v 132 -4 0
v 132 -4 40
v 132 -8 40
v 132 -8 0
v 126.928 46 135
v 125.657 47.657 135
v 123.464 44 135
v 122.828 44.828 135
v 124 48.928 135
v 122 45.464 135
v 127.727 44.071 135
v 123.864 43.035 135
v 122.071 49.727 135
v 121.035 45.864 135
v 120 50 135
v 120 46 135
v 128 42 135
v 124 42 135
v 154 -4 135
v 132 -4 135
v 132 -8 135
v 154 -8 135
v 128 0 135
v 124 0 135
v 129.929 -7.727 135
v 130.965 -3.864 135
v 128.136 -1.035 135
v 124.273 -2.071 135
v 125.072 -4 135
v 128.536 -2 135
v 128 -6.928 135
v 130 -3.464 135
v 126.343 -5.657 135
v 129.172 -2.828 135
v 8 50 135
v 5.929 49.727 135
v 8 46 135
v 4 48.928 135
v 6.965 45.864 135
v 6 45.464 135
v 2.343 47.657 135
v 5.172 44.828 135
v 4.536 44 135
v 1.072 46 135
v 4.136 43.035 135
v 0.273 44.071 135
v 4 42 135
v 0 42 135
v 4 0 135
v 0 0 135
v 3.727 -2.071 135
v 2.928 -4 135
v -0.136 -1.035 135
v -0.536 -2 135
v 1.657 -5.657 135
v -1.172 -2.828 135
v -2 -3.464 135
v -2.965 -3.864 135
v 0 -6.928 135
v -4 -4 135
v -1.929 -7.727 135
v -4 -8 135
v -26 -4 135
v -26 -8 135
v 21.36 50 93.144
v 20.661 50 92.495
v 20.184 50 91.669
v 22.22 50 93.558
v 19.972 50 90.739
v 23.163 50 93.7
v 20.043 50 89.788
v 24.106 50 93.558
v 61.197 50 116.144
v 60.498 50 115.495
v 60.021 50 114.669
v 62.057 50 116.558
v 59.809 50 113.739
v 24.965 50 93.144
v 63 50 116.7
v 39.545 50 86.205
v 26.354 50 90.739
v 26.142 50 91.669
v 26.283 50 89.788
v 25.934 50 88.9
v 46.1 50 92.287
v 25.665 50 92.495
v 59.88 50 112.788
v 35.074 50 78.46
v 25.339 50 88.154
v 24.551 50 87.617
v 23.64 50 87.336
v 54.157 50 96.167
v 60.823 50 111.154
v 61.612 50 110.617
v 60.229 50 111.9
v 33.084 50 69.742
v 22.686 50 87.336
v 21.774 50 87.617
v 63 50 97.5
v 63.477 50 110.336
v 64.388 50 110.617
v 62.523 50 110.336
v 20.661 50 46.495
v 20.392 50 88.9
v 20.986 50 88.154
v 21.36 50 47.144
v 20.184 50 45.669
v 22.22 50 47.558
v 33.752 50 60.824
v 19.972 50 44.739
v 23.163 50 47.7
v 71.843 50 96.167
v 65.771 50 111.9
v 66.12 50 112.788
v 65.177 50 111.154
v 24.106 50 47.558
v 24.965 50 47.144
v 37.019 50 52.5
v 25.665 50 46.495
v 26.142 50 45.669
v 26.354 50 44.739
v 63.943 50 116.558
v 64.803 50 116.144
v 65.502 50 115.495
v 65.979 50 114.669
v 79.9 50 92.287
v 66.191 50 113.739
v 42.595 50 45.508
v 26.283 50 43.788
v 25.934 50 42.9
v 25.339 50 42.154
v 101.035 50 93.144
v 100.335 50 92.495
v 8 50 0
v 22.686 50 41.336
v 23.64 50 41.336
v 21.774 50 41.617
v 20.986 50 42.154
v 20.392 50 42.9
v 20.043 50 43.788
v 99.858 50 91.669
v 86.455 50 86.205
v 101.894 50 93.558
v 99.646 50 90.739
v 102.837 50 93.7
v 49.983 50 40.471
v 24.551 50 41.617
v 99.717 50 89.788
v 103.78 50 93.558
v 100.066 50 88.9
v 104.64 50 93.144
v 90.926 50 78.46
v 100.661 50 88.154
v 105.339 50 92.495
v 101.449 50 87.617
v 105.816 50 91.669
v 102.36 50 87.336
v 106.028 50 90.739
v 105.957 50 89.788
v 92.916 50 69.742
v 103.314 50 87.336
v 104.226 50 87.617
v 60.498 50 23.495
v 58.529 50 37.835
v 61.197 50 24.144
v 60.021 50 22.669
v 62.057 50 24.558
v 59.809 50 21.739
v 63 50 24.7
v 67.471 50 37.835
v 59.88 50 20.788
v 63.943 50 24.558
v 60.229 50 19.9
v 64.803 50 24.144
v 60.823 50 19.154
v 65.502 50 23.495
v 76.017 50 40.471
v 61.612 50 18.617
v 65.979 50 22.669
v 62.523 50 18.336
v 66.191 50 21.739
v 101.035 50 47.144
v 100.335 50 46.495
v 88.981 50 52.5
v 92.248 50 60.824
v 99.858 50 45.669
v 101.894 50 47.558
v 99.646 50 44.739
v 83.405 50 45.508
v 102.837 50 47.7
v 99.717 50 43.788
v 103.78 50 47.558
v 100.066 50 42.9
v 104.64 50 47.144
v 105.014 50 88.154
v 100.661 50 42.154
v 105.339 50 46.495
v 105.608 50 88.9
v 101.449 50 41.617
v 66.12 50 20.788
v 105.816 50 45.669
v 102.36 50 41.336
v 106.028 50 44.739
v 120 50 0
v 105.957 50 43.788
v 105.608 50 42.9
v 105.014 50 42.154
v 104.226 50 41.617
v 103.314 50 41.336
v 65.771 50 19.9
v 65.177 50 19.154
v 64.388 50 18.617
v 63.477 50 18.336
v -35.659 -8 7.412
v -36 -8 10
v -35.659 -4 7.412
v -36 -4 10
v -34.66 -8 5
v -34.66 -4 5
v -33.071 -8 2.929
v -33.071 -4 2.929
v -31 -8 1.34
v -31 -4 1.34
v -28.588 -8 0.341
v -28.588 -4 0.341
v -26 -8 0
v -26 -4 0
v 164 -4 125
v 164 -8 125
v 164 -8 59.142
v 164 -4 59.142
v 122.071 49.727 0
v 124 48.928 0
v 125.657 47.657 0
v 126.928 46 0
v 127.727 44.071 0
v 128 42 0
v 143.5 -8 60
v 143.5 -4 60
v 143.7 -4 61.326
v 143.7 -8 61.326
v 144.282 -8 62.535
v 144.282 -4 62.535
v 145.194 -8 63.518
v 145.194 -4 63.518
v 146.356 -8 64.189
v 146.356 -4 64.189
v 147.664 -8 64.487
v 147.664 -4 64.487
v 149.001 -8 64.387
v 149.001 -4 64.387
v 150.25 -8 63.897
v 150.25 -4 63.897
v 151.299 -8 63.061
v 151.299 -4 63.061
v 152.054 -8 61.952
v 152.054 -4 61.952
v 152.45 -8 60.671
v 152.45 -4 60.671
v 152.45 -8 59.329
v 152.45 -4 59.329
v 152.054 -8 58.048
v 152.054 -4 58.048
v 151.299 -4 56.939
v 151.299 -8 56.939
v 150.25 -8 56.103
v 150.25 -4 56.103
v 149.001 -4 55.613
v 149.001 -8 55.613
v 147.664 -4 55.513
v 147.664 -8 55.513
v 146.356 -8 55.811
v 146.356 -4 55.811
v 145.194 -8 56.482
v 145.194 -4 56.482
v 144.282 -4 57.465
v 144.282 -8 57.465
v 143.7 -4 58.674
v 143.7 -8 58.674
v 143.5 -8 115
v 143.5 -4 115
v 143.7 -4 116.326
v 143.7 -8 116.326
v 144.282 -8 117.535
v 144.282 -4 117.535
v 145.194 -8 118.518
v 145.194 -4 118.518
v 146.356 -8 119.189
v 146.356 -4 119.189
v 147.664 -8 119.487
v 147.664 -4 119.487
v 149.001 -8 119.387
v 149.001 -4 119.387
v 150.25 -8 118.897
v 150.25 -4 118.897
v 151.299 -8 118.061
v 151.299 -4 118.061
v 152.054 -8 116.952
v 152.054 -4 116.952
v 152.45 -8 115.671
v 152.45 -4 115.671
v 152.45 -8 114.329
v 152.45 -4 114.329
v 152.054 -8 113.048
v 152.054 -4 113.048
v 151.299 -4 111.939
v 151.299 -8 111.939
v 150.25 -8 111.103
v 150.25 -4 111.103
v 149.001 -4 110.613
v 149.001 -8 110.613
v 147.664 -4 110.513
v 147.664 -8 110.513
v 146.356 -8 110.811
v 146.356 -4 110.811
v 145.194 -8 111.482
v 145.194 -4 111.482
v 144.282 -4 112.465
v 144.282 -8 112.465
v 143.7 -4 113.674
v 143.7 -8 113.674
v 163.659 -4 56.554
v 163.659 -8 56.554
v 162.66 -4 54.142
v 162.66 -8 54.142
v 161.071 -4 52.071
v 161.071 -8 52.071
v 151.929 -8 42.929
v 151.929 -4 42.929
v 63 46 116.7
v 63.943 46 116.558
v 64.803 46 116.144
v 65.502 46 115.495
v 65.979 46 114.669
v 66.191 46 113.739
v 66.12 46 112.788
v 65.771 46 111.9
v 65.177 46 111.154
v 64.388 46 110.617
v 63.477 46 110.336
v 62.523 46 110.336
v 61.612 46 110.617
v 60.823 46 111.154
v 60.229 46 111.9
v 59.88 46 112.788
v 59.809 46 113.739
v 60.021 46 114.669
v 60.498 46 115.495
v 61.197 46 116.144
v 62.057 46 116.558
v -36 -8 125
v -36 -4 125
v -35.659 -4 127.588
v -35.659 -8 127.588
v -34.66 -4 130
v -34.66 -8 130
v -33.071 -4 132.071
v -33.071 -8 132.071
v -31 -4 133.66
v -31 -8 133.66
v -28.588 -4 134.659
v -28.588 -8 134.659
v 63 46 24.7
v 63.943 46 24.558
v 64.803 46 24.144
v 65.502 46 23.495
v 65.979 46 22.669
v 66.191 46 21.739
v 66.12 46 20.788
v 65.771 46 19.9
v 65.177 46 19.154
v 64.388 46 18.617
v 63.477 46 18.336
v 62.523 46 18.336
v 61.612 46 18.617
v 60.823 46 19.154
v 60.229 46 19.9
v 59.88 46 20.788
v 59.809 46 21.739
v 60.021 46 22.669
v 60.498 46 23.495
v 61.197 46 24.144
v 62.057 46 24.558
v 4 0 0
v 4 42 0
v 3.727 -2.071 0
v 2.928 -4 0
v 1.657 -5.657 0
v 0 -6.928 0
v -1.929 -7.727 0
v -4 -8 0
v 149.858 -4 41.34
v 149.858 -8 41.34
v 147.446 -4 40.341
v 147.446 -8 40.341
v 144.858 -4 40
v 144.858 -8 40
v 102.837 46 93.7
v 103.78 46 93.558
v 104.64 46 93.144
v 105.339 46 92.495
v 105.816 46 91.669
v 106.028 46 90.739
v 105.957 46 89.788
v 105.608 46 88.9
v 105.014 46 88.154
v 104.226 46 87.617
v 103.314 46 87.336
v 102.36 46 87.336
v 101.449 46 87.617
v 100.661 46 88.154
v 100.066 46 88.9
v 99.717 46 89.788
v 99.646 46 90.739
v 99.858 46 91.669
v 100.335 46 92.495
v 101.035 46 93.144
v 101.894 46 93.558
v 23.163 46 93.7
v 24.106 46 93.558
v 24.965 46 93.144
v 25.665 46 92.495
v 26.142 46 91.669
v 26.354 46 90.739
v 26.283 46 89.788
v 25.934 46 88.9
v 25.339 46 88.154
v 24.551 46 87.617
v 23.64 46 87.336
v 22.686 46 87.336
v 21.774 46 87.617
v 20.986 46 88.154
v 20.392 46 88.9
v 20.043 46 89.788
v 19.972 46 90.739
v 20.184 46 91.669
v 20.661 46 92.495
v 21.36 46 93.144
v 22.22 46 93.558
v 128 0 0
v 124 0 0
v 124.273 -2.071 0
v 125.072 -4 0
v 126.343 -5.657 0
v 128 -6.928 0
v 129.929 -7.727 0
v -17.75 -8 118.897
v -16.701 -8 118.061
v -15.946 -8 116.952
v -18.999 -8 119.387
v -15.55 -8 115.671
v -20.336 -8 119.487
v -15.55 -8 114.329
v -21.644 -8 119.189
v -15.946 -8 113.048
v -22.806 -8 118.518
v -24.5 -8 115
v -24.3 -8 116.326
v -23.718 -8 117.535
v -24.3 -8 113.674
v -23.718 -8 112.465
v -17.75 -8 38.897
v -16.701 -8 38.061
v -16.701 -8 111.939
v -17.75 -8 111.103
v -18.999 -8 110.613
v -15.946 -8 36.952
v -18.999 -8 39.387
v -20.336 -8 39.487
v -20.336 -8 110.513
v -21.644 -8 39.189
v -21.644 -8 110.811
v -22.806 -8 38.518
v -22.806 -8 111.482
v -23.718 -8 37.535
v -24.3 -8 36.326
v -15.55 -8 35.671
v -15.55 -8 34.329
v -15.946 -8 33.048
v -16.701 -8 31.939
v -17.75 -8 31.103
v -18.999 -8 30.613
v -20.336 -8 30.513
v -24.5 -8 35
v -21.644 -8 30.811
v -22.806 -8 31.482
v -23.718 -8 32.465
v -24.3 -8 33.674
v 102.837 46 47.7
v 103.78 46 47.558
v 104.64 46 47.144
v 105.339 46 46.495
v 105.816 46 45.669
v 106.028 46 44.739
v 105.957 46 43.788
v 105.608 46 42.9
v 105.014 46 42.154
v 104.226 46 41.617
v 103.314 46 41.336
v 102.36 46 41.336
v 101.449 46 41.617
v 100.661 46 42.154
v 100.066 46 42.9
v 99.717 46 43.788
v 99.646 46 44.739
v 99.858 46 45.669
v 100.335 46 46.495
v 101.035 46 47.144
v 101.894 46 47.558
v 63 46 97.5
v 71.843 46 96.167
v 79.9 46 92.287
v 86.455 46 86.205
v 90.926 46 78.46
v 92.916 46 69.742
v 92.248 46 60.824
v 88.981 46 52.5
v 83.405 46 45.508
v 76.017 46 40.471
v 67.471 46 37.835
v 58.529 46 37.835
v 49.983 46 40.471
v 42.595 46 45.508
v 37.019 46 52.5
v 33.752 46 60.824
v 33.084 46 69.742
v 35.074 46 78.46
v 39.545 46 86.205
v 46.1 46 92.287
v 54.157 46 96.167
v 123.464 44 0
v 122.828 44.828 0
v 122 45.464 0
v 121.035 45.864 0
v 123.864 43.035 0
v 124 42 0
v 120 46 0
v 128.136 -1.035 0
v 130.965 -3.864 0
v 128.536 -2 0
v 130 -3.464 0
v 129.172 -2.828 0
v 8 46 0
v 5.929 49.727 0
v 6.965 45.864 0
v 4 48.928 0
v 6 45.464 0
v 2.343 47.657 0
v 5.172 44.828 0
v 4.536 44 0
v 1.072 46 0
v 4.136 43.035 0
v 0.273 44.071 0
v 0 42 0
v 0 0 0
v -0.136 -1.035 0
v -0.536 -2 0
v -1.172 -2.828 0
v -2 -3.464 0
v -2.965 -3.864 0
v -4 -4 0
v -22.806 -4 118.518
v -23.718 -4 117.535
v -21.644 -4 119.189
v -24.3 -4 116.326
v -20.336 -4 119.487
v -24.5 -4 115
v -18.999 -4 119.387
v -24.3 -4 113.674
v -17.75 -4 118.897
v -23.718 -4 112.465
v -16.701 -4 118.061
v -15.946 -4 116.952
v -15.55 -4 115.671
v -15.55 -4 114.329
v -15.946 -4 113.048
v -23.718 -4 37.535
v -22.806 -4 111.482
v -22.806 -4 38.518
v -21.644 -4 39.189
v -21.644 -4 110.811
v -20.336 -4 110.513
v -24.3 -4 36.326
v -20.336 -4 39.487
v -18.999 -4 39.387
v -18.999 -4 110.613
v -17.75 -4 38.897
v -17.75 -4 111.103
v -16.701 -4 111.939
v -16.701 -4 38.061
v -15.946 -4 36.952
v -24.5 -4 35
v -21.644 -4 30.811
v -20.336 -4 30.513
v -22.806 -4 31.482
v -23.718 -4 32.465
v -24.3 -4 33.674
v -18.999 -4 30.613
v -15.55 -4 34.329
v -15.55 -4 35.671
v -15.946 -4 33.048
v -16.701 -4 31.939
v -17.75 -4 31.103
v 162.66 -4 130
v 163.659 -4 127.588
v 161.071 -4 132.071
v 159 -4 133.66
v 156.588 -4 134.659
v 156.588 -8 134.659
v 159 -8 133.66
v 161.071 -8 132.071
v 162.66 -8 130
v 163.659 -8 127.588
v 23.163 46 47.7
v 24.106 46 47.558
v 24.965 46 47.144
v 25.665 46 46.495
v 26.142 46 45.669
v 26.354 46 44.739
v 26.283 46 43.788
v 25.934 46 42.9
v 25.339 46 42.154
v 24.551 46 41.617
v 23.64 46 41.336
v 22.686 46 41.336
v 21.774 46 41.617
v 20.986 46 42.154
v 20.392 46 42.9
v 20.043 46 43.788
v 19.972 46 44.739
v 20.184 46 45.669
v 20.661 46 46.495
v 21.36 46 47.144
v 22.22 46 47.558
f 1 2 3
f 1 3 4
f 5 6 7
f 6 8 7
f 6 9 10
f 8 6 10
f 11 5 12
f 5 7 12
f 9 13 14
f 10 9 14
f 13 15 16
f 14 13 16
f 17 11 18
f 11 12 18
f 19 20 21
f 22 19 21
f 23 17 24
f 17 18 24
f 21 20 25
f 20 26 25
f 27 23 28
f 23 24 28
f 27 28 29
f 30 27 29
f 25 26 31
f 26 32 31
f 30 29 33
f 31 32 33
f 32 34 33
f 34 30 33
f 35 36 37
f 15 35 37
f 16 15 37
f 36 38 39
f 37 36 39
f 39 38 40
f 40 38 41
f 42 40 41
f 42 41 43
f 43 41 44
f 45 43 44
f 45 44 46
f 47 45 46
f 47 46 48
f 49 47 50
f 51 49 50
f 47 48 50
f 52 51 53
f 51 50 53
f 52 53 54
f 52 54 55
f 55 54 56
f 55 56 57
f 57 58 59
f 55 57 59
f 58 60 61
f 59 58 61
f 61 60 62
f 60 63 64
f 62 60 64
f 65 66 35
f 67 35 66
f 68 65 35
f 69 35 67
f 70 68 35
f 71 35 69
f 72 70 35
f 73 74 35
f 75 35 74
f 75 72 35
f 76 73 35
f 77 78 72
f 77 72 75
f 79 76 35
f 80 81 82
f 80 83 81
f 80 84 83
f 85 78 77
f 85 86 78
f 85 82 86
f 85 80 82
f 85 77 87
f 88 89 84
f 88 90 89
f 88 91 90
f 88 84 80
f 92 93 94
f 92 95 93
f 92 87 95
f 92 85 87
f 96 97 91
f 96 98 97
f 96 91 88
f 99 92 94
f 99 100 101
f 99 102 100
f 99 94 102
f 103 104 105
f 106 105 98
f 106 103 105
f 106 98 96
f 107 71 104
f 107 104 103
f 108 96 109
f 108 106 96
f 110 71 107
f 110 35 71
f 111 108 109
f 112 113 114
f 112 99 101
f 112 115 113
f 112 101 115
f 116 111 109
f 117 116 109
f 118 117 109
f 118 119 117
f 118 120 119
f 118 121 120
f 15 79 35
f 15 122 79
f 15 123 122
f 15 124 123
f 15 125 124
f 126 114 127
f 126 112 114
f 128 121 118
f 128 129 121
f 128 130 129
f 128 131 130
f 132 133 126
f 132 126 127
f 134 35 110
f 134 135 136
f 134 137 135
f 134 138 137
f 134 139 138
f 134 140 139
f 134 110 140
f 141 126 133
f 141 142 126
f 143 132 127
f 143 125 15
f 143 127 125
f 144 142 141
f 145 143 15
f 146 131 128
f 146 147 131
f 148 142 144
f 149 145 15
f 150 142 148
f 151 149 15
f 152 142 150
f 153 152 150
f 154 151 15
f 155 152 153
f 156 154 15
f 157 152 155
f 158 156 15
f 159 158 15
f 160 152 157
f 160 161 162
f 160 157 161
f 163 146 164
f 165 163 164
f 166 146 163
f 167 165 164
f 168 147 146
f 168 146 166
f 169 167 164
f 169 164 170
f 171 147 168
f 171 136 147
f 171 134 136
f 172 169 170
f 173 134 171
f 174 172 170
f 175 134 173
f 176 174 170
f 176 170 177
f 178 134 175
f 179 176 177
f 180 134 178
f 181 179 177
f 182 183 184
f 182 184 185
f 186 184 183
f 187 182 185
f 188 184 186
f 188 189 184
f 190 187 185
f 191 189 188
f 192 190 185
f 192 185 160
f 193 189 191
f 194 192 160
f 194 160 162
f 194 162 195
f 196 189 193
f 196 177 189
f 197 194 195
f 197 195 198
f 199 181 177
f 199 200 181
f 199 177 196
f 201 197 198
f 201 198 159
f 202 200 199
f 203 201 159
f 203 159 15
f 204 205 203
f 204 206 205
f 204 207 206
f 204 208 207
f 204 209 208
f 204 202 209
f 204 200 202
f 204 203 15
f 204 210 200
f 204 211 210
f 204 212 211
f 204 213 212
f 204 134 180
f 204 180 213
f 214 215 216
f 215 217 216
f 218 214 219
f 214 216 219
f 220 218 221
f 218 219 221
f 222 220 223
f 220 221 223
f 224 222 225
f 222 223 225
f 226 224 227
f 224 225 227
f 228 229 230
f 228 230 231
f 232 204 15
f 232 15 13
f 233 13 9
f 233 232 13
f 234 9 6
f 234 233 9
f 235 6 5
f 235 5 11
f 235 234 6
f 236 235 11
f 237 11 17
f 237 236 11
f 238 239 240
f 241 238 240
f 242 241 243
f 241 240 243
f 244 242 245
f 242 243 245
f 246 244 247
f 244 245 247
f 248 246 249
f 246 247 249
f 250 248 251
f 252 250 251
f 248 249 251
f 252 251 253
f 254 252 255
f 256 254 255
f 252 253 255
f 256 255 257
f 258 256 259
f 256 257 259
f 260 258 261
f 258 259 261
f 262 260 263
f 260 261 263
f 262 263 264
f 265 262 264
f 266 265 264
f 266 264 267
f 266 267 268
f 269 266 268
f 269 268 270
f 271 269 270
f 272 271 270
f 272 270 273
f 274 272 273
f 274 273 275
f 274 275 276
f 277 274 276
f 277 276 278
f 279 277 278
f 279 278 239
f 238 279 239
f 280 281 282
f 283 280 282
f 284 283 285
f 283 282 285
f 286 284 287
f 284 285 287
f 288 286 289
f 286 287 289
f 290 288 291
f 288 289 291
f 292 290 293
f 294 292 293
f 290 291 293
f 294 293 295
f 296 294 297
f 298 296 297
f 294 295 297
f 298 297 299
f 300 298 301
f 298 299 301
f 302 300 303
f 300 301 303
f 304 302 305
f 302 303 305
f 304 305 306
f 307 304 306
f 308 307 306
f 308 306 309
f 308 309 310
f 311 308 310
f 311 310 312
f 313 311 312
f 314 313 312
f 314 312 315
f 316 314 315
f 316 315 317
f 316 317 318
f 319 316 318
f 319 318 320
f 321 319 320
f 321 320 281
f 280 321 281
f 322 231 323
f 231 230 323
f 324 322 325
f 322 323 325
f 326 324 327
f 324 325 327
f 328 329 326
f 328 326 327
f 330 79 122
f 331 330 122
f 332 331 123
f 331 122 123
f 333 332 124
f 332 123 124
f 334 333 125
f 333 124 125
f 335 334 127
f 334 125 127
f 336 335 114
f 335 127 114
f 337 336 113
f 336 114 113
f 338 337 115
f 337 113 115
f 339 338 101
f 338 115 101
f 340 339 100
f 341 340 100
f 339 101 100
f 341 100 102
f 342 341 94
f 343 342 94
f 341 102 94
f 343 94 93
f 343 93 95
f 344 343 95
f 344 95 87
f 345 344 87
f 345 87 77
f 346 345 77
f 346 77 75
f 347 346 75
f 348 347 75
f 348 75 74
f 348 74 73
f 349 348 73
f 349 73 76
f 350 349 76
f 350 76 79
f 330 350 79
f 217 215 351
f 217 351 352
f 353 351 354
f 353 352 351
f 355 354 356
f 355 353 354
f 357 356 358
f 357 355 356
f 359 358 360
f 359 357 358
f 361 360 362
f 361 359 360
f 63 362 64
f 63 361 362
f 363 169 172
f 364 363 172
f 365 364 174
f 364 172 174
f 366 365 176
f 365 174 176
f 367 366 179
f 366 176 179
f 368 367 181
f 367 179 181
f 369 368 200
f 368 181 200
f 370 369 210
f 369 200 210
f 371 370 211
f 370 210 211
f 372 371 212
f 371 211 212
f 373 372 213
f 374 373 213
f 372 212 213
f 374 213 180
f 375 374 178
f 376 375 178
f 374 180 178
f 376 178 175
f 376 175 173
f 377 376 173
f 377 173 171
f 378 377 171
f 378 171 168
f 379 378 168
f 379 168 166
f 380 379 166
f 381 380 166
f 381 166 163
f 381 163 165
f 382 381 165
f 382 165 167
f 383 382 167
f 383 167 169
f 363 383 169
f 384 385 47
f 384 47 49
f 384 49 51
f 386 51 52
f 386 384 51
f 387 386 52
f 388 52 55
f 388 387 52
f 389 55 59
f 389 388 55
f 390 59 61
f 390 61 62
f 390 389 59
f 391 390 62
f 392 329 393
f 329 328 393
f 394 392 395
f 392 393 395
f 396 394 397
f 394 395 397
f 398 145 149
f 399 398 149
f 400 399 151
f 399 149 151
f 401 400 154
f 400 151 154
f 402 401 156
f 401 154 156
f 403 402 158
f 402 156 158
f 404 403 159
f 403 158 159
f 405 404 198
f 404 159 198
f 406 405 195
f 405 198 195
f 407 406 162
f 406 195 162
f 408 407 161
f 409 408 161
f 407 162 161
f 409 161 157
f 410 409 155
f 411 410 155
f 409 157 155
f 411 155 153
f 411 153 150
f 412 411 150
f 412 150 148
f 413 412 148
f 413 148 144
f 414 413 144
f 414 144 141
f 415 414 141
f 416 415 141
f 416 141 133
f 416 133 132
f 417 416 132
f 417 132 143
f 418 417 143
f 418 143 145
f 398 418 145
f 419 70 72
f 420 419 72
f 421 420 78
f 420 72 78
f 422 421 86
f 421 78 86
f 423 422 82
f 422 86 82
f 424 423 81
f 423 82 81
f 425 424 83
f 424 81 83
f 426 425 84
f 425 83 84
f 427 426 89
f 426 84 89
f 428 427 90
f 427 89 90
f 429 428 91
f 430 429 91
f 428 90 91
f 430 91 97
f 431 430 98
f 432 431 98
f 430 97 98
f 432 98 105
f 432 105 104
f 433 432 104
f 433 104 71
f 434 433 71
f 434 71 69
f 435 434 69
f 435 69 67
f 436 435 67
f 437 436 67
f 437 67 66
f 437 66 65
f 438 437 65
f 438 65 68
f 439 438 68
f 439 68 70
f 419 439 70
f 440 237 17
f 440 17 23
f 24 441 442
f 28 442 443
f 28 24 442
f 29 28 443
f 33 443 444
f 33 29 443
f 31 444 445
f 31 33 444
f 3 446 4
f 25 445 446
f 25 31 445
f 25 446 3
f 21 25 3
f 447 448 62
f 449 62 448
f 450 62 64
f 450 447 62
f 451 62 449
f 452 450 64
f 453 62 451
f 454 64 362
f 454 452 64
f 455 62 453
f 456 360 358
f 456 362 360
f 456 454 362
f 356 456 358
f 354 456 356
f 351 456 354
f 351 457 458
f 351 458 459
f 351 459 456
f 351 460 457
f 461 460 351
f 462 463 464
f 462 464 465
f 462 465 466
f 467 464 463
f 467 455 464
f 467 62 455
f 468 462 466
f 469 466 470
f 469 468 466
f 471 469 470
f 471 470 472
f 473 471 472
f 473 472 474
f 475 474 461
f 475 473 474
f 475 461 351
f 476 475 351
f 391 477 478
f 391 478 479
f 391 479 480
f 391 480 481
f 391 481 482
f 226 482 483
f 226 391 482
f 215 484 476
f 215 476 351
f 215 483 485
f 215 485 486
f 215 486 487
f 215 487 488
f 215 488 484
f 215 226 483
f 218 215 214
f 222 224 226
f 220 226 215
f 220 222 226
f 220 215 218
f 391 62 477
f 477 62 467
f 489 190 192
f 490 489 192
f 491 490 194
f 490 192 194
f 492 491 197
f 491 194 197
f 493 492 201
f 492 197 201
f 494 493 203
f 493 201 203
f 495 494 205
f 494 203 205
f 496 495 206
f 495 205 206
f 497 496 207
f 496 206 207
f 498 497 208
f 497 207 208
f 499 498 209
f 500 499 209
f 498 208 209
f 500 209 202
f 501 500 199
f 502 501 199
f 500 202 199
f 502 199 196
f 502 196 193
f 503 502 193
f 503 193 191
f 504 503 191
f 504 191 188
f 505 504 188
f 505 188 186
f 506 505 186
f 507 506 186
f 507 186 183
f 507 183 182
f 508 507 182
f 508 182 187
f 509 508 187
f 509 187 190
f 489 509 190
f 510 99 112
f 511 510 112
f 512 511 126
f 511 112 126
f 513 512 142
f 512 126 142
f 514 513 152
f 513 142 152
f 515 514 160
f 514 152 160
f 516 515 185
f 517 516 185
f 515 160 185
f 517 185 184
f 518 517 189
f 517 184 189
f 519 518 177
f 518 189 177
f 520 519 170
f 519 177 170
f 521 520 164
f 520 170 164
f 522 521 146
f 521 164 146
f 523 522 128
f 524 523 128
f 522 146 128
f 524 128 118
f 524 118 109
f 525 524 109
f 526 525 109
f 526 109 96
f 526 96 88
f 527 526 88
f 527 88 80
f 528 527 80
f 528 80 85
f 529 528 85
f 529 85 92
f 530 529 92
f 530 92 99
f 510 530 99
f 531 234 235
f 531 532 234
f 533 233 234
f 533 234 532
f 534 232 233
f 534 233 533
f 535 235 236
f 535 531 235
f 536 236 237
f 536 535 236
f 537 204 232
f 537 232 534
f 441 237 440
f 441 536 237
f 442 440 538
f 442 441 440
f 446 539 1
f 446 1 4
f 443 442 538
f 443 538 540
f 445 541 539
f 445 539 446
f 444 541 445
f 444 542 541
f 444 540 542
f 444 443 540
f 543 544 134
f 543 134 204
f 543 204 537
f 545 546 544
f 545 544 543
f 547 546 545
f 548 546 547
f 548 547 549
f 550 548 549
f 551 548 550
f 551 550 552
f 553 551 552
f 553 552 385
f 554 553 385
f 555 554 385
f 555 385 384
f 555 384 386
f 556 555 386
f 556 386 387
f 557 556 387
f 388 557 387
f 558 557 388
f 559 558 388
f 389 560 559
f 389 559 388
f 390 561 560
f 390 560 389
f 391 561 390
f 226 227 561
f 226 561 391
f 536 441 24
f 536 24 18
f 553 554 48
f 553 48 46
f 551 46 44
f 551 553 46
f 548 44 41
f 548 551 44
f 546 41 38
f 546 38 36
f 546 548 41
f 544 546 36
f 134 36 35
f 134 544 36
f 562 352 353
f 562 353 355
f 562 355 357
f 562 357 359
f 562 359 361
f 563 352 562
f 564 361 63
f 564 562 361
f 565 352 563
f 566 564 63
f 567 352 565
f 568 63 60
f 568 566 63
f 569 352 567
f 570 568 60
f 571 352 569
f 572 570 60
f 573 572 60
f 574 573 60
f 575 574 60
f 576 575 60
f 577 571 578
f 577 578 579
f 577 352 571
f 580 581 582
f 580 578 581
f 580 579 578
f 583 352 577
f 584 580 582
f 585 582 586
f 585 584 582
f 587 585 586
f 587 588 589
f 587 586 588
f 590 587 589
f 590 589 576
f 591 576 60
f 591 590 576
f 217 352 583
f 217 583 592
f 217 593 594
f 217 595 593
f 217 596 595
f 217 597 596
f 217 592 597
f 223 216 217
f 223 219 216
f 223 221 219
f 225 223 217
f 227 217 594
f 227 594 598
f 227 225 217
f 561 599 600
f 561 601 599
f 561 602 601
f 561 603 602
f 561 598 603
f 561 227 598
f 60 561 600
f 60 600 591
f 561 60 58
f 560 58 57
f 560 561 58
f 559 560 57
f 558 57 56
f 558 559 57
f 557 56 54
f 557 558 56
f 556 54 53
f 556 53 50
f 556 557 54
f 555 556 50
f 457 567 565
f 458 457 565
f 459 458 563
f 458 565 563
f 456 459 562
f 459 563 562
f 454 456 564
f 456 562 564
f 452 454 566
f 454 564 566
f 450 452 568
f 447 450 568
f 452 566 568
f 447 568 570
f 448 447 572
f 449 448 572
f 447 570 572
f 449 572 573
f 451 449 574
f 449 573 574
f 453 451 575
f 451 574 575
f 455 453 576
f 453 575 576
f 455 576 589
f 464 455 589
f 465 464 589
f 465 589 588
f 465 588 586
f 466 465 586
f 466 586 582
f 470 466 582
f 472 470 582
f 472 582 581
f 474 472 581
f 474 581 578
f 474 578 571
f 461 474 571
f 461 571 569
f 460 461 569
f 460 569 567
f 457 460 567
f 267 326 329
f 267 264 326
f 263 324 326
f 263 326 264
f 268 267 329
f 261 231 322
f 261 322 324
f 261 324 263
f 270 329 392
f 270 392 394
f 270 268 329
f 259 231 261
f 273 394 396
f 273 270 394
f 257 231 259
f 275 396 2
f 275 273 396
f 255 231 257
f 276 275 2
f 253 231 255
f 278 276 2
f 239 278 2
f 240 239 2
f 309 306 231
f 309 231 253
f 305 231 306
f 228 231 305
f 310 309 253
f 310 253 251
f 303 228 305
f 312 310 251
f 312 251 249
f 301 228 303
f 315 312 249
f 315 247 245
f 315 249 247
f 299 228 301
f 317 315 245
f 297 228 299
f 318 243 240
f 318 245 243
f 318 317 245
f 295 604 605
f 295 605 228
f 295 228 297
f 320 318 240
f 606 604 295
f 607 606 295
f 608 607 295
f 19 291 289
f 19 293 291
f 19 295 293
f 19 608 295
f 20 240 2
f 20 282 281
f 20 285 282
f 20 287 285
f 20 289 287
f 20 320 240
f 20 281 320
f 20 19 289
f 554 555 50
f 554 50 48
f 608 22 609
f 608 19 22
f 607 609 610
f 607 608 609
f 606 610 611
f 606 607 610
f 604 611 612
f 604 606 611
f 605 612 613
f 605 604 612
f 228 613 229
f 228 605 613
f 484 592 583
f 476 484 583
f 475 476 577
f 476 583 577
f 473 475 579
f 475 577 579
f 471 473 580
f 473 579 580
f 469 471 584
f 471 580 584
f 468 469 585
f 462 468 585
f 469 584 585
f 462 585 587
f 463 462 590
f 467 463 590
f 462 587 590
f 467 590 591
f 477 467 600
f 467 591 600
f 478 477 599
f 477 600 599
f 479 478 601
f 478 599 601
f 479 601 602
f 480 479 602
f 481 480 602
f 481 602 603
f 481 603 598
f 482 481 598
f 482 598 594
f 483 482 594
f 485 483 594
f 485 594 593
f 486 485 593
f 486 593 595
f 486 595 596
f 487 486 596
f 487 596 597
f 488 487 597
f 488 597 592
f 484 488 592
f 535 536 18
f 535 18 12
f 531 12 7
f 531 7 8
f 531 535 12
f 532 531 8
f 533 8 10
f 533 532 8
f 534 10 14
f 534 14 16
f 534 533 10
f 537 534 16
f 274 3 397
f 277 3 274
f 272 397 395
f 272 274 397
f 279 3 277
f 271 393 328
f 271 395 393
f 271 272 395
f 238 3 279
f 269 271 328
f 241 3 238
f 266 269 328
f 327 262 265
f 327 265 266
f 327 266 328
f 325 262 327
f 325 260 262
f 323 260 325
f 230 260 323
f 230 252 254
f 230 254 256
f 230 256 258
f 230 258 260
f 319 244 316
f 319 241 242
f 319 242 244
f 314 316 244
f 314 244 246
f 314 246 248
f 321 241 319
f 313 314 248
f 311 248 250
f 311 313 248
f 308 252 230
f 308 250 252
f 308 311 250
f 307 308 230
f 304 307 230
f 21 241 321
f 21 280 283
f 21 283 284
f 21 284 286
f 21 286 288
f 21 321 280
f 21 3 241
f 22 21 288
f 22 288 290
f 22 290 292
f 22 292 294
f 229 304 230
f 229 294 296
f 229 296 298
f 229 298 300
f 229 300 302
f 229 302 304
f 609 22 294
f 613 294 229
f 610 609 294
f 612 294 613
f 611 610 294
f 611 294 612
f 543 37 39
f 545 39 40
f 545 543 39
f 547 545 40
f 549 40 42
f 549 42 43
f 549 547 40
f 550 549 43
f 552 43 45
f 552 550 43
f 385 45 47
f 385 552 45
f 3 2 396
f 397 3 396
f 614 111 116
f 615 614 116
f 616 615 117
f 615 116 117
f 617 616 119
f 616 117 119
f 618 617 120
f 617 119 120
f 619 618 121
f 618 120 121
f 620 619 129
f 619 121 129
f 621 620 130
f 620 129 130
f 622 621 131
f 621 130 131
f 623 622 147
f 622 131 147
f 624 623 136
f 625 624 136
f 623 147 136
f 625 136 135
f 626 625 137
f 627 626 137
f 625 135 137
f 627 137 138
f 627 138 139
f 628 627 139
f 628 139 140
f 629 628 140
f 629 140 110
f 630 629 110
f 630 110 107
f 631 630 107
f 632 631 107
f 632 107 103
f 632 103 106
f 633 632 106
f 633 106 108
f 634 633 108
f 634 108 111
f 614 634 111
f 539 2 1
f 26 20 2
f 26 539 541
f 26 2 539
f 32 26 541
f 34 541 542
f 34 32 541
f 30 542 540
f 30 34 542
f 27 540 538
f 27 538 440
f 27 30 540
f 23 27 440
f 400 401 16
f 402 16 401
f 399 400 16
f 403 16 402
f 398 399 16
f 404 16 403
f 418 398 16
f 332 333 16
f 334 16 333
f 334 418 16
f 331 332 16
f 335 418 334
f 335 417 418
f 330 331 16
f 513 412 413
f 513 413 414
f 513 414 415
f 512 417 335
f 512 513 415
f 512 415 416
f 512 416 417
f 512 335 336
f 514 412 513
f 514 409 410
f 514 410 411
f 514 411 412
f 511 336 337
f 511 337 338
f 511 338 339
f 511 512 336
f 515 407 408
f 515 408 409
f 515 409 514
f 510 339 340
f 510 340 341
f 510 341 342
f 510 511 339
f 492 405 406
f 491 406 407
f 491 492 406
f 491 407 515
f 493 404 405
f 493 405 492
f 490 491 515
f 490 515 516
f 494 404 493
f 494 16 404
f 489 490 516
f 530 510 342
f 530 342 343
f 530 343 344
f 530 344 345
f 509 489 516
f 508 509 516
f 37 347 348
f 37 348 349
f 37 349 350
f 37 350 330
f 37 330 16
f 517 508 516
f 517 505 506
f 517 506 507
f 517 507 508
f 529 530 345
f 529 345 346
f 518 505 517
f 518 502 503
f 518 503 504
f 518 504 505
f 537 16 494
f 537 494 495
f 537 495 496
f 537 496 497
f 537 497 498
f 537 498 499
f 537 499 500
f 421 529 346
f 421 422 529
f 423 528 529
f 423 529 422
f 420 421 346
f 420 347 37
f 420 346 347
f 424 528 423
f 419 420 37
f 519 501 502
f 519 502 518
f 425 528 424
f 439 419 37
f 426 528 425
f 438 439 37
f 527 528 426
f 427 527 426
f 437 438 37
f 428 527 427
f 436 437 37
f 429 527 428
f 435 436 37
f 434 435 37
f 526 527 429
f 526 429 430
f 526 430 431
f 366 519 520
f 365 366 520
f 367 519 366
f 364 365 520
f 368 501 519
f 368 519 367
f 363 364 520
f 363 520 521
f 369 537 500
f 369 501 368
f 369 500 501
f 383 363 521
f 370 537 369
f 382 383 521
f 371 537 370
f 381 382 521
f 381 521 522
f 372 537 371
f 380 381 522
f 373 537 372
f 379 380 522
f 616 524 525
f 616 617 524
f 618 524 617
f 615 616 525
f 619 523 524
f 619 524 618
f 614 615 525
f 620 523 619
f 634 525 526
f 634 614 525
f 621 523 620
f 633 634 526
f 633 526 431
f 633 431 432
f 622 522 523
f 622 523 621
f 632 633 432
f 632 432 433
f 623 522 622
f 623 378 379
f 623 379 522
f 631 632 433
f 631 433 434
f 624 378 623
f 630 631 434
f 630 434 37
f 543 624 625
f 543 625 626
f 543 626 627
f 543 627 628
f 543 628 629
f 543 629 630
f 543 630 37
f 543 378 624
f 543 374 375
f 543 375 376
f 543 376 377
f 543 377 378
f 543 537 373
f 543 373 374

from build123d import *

# Parameters (mm, degrees)
TABAN_FLAN_1_DEPTH      = 135
IZIM2_R                 = 3.2
IZIM2_R_2               = 30
KES_EKSTR_ZYON1_DEPTH   = 10
KENAR_FLAN_1_DEPTH      = 135
KENAR_FLAN_1_BEND_DEPTH = 135
IZIM6_W                 = 32
IZIM6_H                 = 40
KES_EKSTR_ZYON2_DEPTH   = 10
RADYUS2_R               = 10
IZIM10_R                = 4.5
KES_EKSTR_ZYON3_DEPTH   = 10
PAH1_SIZE               = 15
RADYUS3_R               = 10


# Sheet-metal steps are written as plain solids
with BuildPart() as part:
    # Çizim1 → Taban-Flanş1 (new body)
    with BuildSketch(Plane.XY):
        with BuildLine():
            Line((0, 0), (0, 42))
            ThreePointArc((0, 42), (2.343145751, 47.656854249), (8, 50))
            Line((8, 50), (120, 50))
            ThreePointArc((120, 50), (125.656854249, 47.656854249), (128, 42))
            Line((128, 42), (128, 0))
            Line((128, 0), (124, 0))
            Line((124, 0), (124, 42))
            ThreePointArc((124, 42), (122.828427125, 44.828427125), (120, 46))
            Line((120, 46), (8, 46))
            ThreePointArc((8, 46), (5.171572875, 44.828427125), (4, 42))
            Line((4, 42), (4, 0))
            Line((4, 0), (0, 0))
        make_face()
    extrude(amount=TABAN_FLAN_1_DEPTH)

    # Çizim2 → Kes-Ekstrüzyon1 (cut)
    with BuildSketch(Plane(origin=(0, 50, 0), x_dir=(1, 0, 0), z_dir=(0, 1, 0))):
        with Locations(Location((63, -21.5, 0), (0, 0, 270))):
            Circle(IZIM2_R)
        with Locations(Location((102.837168574, -44.5, 0), (0, 0, 270))):
            Circle(IZIM2_R)
        with Locations(Location((102.837168574, -90.5, 0), (0, 0, 270))):
            Circle(IZIM2_R)
        with Locations(Location((63, -113.5, 0), (0, 0, 270))):
            Circle(IZIM2_R)
        with Locations(Location((23.162831426, -90.5, 0), (0, 0, 270))):
            Circle(IZIM2_R)
        with Locations(Location((23.162831426, -44.5, 0), (0, 0, 270))):
            Circle(IZIM2_R)
        with Locations(Location((63, -67.5, 0), (0, 0, 270))):
            Circle(IZIM2_R_2)
    extrude(amount=-KES_EKSTR_ZYON1_DEPTH, mode=Mode.SUBTRACT)

    # Kenar-Flanş1 section (across the edge) → Kenar-Flanş1 (add)
    with BuildSketch(Plane(origin=(128, -4, 135), x_dir=(0, 1, 0), z_dir=(0, 0, -1))):
        with BuildLine():
            Line((-4, 4), (-4, 36))
            Line((-4, 36), (0, 36))
            Line((0, 36), (0, 4))
            ThreePointArc((0, 4), (1.171572875, 1.171572875), (4, 0))
            Line((4, 0), (4, -4))
            ThreePointArc((4, -4), (-1.656854249, -1.656854249), (-4, 4))
        make_face()
    extrude(amount=KENAR_FLAN_1_DEPTH)

    # Kenar-Flanş1 section 2 (across the edge) → Kenar-Flanş1 bend (add)
    with BuildSketch(Plane(origin=(0, -4, 0), x_dir=(0, 1, 0), z_dir=(0, 0, 1))):
        with BuildLine():
            Line((-4, 4), (-4, 36))
            Line((-4, 36), (0, 36))
            Line((0, 36), (0, 4))
            ThreePointArc((0, 4), (1.171572875, 1.171572875), (4, 0))
            Line((4, 0), (4, -4))
            ThreePointArc((4, -4), (-1.656854249, -1.656854249), (-4, 4))
        make_face()
    extrude(amount=KENAR_FLAN_1_BEND_DEPTH)

    # Çizim6 → Kes-Ekstrüzyon2 (cut)
    with BuildSketch(Plane(origin=(0, -4, 0), x_dir=(1, 0, 0), z_dir=(0, 1, 0))):
        with Locations((148, -20)):
            Rectangle(IZIM6_W, IZIM6_H)
    extrude(amount=-KES_EKSTR_ZYON2_DEPTH, mode=Mode.SUBTRACT)

    # Radyus2
    radyus2_edges = [part.edges().sort_by_distance(p)[0] for p in [
        (-36, -6, 0),
        (-36, -6, 135),
        (164, -6, 135),
    ]]
    fillet(radyus2_edges, radius=RADYUS2_R)

    # Çizim10 → Kes-Ekstrüzyon3 (cut)
    with BuildSketch(Plane(origin=(0, -4, 0), x_dir=(1, 0, 0), z_dir=(0, 1, 0))):
        with Locations(Location((148, -115, 0), (0, 0, 180))):
            Circle(IZIM10_R)
        with Locations(Location((148, -60, 0), (0, 0, 180))):
            Circle(IZIM10_R)
        with Locations(Location((-20, -115, 0), (0, 0, 180))):
            Circle(IZIM10_R)
        with Locations(Location((-20, -35, 0), (0, 0, 180))):
            Circle(IZIM10_R)
    extrude(amount=-KES_EKSTR_ZYON3_DEPTH, mode=Mode.SUBTRACT)

    # Pah1
    pah1_edges = [part.edges().sort_by_distance(p)[0] for p in [
        (164, -6, 40),
    ]]
    chamfer(pah1_edges, length=PAH1_SIZE)

    # Radyus3
    radyus3_edges = [part.edges().sort_by_distance(p)[0] for p in [
        (164, -6, 55),
        (149, -6, 40),
    ]]
    fillet(radyus3_edges, radius=RADYUS3_R)


solid = part.part
